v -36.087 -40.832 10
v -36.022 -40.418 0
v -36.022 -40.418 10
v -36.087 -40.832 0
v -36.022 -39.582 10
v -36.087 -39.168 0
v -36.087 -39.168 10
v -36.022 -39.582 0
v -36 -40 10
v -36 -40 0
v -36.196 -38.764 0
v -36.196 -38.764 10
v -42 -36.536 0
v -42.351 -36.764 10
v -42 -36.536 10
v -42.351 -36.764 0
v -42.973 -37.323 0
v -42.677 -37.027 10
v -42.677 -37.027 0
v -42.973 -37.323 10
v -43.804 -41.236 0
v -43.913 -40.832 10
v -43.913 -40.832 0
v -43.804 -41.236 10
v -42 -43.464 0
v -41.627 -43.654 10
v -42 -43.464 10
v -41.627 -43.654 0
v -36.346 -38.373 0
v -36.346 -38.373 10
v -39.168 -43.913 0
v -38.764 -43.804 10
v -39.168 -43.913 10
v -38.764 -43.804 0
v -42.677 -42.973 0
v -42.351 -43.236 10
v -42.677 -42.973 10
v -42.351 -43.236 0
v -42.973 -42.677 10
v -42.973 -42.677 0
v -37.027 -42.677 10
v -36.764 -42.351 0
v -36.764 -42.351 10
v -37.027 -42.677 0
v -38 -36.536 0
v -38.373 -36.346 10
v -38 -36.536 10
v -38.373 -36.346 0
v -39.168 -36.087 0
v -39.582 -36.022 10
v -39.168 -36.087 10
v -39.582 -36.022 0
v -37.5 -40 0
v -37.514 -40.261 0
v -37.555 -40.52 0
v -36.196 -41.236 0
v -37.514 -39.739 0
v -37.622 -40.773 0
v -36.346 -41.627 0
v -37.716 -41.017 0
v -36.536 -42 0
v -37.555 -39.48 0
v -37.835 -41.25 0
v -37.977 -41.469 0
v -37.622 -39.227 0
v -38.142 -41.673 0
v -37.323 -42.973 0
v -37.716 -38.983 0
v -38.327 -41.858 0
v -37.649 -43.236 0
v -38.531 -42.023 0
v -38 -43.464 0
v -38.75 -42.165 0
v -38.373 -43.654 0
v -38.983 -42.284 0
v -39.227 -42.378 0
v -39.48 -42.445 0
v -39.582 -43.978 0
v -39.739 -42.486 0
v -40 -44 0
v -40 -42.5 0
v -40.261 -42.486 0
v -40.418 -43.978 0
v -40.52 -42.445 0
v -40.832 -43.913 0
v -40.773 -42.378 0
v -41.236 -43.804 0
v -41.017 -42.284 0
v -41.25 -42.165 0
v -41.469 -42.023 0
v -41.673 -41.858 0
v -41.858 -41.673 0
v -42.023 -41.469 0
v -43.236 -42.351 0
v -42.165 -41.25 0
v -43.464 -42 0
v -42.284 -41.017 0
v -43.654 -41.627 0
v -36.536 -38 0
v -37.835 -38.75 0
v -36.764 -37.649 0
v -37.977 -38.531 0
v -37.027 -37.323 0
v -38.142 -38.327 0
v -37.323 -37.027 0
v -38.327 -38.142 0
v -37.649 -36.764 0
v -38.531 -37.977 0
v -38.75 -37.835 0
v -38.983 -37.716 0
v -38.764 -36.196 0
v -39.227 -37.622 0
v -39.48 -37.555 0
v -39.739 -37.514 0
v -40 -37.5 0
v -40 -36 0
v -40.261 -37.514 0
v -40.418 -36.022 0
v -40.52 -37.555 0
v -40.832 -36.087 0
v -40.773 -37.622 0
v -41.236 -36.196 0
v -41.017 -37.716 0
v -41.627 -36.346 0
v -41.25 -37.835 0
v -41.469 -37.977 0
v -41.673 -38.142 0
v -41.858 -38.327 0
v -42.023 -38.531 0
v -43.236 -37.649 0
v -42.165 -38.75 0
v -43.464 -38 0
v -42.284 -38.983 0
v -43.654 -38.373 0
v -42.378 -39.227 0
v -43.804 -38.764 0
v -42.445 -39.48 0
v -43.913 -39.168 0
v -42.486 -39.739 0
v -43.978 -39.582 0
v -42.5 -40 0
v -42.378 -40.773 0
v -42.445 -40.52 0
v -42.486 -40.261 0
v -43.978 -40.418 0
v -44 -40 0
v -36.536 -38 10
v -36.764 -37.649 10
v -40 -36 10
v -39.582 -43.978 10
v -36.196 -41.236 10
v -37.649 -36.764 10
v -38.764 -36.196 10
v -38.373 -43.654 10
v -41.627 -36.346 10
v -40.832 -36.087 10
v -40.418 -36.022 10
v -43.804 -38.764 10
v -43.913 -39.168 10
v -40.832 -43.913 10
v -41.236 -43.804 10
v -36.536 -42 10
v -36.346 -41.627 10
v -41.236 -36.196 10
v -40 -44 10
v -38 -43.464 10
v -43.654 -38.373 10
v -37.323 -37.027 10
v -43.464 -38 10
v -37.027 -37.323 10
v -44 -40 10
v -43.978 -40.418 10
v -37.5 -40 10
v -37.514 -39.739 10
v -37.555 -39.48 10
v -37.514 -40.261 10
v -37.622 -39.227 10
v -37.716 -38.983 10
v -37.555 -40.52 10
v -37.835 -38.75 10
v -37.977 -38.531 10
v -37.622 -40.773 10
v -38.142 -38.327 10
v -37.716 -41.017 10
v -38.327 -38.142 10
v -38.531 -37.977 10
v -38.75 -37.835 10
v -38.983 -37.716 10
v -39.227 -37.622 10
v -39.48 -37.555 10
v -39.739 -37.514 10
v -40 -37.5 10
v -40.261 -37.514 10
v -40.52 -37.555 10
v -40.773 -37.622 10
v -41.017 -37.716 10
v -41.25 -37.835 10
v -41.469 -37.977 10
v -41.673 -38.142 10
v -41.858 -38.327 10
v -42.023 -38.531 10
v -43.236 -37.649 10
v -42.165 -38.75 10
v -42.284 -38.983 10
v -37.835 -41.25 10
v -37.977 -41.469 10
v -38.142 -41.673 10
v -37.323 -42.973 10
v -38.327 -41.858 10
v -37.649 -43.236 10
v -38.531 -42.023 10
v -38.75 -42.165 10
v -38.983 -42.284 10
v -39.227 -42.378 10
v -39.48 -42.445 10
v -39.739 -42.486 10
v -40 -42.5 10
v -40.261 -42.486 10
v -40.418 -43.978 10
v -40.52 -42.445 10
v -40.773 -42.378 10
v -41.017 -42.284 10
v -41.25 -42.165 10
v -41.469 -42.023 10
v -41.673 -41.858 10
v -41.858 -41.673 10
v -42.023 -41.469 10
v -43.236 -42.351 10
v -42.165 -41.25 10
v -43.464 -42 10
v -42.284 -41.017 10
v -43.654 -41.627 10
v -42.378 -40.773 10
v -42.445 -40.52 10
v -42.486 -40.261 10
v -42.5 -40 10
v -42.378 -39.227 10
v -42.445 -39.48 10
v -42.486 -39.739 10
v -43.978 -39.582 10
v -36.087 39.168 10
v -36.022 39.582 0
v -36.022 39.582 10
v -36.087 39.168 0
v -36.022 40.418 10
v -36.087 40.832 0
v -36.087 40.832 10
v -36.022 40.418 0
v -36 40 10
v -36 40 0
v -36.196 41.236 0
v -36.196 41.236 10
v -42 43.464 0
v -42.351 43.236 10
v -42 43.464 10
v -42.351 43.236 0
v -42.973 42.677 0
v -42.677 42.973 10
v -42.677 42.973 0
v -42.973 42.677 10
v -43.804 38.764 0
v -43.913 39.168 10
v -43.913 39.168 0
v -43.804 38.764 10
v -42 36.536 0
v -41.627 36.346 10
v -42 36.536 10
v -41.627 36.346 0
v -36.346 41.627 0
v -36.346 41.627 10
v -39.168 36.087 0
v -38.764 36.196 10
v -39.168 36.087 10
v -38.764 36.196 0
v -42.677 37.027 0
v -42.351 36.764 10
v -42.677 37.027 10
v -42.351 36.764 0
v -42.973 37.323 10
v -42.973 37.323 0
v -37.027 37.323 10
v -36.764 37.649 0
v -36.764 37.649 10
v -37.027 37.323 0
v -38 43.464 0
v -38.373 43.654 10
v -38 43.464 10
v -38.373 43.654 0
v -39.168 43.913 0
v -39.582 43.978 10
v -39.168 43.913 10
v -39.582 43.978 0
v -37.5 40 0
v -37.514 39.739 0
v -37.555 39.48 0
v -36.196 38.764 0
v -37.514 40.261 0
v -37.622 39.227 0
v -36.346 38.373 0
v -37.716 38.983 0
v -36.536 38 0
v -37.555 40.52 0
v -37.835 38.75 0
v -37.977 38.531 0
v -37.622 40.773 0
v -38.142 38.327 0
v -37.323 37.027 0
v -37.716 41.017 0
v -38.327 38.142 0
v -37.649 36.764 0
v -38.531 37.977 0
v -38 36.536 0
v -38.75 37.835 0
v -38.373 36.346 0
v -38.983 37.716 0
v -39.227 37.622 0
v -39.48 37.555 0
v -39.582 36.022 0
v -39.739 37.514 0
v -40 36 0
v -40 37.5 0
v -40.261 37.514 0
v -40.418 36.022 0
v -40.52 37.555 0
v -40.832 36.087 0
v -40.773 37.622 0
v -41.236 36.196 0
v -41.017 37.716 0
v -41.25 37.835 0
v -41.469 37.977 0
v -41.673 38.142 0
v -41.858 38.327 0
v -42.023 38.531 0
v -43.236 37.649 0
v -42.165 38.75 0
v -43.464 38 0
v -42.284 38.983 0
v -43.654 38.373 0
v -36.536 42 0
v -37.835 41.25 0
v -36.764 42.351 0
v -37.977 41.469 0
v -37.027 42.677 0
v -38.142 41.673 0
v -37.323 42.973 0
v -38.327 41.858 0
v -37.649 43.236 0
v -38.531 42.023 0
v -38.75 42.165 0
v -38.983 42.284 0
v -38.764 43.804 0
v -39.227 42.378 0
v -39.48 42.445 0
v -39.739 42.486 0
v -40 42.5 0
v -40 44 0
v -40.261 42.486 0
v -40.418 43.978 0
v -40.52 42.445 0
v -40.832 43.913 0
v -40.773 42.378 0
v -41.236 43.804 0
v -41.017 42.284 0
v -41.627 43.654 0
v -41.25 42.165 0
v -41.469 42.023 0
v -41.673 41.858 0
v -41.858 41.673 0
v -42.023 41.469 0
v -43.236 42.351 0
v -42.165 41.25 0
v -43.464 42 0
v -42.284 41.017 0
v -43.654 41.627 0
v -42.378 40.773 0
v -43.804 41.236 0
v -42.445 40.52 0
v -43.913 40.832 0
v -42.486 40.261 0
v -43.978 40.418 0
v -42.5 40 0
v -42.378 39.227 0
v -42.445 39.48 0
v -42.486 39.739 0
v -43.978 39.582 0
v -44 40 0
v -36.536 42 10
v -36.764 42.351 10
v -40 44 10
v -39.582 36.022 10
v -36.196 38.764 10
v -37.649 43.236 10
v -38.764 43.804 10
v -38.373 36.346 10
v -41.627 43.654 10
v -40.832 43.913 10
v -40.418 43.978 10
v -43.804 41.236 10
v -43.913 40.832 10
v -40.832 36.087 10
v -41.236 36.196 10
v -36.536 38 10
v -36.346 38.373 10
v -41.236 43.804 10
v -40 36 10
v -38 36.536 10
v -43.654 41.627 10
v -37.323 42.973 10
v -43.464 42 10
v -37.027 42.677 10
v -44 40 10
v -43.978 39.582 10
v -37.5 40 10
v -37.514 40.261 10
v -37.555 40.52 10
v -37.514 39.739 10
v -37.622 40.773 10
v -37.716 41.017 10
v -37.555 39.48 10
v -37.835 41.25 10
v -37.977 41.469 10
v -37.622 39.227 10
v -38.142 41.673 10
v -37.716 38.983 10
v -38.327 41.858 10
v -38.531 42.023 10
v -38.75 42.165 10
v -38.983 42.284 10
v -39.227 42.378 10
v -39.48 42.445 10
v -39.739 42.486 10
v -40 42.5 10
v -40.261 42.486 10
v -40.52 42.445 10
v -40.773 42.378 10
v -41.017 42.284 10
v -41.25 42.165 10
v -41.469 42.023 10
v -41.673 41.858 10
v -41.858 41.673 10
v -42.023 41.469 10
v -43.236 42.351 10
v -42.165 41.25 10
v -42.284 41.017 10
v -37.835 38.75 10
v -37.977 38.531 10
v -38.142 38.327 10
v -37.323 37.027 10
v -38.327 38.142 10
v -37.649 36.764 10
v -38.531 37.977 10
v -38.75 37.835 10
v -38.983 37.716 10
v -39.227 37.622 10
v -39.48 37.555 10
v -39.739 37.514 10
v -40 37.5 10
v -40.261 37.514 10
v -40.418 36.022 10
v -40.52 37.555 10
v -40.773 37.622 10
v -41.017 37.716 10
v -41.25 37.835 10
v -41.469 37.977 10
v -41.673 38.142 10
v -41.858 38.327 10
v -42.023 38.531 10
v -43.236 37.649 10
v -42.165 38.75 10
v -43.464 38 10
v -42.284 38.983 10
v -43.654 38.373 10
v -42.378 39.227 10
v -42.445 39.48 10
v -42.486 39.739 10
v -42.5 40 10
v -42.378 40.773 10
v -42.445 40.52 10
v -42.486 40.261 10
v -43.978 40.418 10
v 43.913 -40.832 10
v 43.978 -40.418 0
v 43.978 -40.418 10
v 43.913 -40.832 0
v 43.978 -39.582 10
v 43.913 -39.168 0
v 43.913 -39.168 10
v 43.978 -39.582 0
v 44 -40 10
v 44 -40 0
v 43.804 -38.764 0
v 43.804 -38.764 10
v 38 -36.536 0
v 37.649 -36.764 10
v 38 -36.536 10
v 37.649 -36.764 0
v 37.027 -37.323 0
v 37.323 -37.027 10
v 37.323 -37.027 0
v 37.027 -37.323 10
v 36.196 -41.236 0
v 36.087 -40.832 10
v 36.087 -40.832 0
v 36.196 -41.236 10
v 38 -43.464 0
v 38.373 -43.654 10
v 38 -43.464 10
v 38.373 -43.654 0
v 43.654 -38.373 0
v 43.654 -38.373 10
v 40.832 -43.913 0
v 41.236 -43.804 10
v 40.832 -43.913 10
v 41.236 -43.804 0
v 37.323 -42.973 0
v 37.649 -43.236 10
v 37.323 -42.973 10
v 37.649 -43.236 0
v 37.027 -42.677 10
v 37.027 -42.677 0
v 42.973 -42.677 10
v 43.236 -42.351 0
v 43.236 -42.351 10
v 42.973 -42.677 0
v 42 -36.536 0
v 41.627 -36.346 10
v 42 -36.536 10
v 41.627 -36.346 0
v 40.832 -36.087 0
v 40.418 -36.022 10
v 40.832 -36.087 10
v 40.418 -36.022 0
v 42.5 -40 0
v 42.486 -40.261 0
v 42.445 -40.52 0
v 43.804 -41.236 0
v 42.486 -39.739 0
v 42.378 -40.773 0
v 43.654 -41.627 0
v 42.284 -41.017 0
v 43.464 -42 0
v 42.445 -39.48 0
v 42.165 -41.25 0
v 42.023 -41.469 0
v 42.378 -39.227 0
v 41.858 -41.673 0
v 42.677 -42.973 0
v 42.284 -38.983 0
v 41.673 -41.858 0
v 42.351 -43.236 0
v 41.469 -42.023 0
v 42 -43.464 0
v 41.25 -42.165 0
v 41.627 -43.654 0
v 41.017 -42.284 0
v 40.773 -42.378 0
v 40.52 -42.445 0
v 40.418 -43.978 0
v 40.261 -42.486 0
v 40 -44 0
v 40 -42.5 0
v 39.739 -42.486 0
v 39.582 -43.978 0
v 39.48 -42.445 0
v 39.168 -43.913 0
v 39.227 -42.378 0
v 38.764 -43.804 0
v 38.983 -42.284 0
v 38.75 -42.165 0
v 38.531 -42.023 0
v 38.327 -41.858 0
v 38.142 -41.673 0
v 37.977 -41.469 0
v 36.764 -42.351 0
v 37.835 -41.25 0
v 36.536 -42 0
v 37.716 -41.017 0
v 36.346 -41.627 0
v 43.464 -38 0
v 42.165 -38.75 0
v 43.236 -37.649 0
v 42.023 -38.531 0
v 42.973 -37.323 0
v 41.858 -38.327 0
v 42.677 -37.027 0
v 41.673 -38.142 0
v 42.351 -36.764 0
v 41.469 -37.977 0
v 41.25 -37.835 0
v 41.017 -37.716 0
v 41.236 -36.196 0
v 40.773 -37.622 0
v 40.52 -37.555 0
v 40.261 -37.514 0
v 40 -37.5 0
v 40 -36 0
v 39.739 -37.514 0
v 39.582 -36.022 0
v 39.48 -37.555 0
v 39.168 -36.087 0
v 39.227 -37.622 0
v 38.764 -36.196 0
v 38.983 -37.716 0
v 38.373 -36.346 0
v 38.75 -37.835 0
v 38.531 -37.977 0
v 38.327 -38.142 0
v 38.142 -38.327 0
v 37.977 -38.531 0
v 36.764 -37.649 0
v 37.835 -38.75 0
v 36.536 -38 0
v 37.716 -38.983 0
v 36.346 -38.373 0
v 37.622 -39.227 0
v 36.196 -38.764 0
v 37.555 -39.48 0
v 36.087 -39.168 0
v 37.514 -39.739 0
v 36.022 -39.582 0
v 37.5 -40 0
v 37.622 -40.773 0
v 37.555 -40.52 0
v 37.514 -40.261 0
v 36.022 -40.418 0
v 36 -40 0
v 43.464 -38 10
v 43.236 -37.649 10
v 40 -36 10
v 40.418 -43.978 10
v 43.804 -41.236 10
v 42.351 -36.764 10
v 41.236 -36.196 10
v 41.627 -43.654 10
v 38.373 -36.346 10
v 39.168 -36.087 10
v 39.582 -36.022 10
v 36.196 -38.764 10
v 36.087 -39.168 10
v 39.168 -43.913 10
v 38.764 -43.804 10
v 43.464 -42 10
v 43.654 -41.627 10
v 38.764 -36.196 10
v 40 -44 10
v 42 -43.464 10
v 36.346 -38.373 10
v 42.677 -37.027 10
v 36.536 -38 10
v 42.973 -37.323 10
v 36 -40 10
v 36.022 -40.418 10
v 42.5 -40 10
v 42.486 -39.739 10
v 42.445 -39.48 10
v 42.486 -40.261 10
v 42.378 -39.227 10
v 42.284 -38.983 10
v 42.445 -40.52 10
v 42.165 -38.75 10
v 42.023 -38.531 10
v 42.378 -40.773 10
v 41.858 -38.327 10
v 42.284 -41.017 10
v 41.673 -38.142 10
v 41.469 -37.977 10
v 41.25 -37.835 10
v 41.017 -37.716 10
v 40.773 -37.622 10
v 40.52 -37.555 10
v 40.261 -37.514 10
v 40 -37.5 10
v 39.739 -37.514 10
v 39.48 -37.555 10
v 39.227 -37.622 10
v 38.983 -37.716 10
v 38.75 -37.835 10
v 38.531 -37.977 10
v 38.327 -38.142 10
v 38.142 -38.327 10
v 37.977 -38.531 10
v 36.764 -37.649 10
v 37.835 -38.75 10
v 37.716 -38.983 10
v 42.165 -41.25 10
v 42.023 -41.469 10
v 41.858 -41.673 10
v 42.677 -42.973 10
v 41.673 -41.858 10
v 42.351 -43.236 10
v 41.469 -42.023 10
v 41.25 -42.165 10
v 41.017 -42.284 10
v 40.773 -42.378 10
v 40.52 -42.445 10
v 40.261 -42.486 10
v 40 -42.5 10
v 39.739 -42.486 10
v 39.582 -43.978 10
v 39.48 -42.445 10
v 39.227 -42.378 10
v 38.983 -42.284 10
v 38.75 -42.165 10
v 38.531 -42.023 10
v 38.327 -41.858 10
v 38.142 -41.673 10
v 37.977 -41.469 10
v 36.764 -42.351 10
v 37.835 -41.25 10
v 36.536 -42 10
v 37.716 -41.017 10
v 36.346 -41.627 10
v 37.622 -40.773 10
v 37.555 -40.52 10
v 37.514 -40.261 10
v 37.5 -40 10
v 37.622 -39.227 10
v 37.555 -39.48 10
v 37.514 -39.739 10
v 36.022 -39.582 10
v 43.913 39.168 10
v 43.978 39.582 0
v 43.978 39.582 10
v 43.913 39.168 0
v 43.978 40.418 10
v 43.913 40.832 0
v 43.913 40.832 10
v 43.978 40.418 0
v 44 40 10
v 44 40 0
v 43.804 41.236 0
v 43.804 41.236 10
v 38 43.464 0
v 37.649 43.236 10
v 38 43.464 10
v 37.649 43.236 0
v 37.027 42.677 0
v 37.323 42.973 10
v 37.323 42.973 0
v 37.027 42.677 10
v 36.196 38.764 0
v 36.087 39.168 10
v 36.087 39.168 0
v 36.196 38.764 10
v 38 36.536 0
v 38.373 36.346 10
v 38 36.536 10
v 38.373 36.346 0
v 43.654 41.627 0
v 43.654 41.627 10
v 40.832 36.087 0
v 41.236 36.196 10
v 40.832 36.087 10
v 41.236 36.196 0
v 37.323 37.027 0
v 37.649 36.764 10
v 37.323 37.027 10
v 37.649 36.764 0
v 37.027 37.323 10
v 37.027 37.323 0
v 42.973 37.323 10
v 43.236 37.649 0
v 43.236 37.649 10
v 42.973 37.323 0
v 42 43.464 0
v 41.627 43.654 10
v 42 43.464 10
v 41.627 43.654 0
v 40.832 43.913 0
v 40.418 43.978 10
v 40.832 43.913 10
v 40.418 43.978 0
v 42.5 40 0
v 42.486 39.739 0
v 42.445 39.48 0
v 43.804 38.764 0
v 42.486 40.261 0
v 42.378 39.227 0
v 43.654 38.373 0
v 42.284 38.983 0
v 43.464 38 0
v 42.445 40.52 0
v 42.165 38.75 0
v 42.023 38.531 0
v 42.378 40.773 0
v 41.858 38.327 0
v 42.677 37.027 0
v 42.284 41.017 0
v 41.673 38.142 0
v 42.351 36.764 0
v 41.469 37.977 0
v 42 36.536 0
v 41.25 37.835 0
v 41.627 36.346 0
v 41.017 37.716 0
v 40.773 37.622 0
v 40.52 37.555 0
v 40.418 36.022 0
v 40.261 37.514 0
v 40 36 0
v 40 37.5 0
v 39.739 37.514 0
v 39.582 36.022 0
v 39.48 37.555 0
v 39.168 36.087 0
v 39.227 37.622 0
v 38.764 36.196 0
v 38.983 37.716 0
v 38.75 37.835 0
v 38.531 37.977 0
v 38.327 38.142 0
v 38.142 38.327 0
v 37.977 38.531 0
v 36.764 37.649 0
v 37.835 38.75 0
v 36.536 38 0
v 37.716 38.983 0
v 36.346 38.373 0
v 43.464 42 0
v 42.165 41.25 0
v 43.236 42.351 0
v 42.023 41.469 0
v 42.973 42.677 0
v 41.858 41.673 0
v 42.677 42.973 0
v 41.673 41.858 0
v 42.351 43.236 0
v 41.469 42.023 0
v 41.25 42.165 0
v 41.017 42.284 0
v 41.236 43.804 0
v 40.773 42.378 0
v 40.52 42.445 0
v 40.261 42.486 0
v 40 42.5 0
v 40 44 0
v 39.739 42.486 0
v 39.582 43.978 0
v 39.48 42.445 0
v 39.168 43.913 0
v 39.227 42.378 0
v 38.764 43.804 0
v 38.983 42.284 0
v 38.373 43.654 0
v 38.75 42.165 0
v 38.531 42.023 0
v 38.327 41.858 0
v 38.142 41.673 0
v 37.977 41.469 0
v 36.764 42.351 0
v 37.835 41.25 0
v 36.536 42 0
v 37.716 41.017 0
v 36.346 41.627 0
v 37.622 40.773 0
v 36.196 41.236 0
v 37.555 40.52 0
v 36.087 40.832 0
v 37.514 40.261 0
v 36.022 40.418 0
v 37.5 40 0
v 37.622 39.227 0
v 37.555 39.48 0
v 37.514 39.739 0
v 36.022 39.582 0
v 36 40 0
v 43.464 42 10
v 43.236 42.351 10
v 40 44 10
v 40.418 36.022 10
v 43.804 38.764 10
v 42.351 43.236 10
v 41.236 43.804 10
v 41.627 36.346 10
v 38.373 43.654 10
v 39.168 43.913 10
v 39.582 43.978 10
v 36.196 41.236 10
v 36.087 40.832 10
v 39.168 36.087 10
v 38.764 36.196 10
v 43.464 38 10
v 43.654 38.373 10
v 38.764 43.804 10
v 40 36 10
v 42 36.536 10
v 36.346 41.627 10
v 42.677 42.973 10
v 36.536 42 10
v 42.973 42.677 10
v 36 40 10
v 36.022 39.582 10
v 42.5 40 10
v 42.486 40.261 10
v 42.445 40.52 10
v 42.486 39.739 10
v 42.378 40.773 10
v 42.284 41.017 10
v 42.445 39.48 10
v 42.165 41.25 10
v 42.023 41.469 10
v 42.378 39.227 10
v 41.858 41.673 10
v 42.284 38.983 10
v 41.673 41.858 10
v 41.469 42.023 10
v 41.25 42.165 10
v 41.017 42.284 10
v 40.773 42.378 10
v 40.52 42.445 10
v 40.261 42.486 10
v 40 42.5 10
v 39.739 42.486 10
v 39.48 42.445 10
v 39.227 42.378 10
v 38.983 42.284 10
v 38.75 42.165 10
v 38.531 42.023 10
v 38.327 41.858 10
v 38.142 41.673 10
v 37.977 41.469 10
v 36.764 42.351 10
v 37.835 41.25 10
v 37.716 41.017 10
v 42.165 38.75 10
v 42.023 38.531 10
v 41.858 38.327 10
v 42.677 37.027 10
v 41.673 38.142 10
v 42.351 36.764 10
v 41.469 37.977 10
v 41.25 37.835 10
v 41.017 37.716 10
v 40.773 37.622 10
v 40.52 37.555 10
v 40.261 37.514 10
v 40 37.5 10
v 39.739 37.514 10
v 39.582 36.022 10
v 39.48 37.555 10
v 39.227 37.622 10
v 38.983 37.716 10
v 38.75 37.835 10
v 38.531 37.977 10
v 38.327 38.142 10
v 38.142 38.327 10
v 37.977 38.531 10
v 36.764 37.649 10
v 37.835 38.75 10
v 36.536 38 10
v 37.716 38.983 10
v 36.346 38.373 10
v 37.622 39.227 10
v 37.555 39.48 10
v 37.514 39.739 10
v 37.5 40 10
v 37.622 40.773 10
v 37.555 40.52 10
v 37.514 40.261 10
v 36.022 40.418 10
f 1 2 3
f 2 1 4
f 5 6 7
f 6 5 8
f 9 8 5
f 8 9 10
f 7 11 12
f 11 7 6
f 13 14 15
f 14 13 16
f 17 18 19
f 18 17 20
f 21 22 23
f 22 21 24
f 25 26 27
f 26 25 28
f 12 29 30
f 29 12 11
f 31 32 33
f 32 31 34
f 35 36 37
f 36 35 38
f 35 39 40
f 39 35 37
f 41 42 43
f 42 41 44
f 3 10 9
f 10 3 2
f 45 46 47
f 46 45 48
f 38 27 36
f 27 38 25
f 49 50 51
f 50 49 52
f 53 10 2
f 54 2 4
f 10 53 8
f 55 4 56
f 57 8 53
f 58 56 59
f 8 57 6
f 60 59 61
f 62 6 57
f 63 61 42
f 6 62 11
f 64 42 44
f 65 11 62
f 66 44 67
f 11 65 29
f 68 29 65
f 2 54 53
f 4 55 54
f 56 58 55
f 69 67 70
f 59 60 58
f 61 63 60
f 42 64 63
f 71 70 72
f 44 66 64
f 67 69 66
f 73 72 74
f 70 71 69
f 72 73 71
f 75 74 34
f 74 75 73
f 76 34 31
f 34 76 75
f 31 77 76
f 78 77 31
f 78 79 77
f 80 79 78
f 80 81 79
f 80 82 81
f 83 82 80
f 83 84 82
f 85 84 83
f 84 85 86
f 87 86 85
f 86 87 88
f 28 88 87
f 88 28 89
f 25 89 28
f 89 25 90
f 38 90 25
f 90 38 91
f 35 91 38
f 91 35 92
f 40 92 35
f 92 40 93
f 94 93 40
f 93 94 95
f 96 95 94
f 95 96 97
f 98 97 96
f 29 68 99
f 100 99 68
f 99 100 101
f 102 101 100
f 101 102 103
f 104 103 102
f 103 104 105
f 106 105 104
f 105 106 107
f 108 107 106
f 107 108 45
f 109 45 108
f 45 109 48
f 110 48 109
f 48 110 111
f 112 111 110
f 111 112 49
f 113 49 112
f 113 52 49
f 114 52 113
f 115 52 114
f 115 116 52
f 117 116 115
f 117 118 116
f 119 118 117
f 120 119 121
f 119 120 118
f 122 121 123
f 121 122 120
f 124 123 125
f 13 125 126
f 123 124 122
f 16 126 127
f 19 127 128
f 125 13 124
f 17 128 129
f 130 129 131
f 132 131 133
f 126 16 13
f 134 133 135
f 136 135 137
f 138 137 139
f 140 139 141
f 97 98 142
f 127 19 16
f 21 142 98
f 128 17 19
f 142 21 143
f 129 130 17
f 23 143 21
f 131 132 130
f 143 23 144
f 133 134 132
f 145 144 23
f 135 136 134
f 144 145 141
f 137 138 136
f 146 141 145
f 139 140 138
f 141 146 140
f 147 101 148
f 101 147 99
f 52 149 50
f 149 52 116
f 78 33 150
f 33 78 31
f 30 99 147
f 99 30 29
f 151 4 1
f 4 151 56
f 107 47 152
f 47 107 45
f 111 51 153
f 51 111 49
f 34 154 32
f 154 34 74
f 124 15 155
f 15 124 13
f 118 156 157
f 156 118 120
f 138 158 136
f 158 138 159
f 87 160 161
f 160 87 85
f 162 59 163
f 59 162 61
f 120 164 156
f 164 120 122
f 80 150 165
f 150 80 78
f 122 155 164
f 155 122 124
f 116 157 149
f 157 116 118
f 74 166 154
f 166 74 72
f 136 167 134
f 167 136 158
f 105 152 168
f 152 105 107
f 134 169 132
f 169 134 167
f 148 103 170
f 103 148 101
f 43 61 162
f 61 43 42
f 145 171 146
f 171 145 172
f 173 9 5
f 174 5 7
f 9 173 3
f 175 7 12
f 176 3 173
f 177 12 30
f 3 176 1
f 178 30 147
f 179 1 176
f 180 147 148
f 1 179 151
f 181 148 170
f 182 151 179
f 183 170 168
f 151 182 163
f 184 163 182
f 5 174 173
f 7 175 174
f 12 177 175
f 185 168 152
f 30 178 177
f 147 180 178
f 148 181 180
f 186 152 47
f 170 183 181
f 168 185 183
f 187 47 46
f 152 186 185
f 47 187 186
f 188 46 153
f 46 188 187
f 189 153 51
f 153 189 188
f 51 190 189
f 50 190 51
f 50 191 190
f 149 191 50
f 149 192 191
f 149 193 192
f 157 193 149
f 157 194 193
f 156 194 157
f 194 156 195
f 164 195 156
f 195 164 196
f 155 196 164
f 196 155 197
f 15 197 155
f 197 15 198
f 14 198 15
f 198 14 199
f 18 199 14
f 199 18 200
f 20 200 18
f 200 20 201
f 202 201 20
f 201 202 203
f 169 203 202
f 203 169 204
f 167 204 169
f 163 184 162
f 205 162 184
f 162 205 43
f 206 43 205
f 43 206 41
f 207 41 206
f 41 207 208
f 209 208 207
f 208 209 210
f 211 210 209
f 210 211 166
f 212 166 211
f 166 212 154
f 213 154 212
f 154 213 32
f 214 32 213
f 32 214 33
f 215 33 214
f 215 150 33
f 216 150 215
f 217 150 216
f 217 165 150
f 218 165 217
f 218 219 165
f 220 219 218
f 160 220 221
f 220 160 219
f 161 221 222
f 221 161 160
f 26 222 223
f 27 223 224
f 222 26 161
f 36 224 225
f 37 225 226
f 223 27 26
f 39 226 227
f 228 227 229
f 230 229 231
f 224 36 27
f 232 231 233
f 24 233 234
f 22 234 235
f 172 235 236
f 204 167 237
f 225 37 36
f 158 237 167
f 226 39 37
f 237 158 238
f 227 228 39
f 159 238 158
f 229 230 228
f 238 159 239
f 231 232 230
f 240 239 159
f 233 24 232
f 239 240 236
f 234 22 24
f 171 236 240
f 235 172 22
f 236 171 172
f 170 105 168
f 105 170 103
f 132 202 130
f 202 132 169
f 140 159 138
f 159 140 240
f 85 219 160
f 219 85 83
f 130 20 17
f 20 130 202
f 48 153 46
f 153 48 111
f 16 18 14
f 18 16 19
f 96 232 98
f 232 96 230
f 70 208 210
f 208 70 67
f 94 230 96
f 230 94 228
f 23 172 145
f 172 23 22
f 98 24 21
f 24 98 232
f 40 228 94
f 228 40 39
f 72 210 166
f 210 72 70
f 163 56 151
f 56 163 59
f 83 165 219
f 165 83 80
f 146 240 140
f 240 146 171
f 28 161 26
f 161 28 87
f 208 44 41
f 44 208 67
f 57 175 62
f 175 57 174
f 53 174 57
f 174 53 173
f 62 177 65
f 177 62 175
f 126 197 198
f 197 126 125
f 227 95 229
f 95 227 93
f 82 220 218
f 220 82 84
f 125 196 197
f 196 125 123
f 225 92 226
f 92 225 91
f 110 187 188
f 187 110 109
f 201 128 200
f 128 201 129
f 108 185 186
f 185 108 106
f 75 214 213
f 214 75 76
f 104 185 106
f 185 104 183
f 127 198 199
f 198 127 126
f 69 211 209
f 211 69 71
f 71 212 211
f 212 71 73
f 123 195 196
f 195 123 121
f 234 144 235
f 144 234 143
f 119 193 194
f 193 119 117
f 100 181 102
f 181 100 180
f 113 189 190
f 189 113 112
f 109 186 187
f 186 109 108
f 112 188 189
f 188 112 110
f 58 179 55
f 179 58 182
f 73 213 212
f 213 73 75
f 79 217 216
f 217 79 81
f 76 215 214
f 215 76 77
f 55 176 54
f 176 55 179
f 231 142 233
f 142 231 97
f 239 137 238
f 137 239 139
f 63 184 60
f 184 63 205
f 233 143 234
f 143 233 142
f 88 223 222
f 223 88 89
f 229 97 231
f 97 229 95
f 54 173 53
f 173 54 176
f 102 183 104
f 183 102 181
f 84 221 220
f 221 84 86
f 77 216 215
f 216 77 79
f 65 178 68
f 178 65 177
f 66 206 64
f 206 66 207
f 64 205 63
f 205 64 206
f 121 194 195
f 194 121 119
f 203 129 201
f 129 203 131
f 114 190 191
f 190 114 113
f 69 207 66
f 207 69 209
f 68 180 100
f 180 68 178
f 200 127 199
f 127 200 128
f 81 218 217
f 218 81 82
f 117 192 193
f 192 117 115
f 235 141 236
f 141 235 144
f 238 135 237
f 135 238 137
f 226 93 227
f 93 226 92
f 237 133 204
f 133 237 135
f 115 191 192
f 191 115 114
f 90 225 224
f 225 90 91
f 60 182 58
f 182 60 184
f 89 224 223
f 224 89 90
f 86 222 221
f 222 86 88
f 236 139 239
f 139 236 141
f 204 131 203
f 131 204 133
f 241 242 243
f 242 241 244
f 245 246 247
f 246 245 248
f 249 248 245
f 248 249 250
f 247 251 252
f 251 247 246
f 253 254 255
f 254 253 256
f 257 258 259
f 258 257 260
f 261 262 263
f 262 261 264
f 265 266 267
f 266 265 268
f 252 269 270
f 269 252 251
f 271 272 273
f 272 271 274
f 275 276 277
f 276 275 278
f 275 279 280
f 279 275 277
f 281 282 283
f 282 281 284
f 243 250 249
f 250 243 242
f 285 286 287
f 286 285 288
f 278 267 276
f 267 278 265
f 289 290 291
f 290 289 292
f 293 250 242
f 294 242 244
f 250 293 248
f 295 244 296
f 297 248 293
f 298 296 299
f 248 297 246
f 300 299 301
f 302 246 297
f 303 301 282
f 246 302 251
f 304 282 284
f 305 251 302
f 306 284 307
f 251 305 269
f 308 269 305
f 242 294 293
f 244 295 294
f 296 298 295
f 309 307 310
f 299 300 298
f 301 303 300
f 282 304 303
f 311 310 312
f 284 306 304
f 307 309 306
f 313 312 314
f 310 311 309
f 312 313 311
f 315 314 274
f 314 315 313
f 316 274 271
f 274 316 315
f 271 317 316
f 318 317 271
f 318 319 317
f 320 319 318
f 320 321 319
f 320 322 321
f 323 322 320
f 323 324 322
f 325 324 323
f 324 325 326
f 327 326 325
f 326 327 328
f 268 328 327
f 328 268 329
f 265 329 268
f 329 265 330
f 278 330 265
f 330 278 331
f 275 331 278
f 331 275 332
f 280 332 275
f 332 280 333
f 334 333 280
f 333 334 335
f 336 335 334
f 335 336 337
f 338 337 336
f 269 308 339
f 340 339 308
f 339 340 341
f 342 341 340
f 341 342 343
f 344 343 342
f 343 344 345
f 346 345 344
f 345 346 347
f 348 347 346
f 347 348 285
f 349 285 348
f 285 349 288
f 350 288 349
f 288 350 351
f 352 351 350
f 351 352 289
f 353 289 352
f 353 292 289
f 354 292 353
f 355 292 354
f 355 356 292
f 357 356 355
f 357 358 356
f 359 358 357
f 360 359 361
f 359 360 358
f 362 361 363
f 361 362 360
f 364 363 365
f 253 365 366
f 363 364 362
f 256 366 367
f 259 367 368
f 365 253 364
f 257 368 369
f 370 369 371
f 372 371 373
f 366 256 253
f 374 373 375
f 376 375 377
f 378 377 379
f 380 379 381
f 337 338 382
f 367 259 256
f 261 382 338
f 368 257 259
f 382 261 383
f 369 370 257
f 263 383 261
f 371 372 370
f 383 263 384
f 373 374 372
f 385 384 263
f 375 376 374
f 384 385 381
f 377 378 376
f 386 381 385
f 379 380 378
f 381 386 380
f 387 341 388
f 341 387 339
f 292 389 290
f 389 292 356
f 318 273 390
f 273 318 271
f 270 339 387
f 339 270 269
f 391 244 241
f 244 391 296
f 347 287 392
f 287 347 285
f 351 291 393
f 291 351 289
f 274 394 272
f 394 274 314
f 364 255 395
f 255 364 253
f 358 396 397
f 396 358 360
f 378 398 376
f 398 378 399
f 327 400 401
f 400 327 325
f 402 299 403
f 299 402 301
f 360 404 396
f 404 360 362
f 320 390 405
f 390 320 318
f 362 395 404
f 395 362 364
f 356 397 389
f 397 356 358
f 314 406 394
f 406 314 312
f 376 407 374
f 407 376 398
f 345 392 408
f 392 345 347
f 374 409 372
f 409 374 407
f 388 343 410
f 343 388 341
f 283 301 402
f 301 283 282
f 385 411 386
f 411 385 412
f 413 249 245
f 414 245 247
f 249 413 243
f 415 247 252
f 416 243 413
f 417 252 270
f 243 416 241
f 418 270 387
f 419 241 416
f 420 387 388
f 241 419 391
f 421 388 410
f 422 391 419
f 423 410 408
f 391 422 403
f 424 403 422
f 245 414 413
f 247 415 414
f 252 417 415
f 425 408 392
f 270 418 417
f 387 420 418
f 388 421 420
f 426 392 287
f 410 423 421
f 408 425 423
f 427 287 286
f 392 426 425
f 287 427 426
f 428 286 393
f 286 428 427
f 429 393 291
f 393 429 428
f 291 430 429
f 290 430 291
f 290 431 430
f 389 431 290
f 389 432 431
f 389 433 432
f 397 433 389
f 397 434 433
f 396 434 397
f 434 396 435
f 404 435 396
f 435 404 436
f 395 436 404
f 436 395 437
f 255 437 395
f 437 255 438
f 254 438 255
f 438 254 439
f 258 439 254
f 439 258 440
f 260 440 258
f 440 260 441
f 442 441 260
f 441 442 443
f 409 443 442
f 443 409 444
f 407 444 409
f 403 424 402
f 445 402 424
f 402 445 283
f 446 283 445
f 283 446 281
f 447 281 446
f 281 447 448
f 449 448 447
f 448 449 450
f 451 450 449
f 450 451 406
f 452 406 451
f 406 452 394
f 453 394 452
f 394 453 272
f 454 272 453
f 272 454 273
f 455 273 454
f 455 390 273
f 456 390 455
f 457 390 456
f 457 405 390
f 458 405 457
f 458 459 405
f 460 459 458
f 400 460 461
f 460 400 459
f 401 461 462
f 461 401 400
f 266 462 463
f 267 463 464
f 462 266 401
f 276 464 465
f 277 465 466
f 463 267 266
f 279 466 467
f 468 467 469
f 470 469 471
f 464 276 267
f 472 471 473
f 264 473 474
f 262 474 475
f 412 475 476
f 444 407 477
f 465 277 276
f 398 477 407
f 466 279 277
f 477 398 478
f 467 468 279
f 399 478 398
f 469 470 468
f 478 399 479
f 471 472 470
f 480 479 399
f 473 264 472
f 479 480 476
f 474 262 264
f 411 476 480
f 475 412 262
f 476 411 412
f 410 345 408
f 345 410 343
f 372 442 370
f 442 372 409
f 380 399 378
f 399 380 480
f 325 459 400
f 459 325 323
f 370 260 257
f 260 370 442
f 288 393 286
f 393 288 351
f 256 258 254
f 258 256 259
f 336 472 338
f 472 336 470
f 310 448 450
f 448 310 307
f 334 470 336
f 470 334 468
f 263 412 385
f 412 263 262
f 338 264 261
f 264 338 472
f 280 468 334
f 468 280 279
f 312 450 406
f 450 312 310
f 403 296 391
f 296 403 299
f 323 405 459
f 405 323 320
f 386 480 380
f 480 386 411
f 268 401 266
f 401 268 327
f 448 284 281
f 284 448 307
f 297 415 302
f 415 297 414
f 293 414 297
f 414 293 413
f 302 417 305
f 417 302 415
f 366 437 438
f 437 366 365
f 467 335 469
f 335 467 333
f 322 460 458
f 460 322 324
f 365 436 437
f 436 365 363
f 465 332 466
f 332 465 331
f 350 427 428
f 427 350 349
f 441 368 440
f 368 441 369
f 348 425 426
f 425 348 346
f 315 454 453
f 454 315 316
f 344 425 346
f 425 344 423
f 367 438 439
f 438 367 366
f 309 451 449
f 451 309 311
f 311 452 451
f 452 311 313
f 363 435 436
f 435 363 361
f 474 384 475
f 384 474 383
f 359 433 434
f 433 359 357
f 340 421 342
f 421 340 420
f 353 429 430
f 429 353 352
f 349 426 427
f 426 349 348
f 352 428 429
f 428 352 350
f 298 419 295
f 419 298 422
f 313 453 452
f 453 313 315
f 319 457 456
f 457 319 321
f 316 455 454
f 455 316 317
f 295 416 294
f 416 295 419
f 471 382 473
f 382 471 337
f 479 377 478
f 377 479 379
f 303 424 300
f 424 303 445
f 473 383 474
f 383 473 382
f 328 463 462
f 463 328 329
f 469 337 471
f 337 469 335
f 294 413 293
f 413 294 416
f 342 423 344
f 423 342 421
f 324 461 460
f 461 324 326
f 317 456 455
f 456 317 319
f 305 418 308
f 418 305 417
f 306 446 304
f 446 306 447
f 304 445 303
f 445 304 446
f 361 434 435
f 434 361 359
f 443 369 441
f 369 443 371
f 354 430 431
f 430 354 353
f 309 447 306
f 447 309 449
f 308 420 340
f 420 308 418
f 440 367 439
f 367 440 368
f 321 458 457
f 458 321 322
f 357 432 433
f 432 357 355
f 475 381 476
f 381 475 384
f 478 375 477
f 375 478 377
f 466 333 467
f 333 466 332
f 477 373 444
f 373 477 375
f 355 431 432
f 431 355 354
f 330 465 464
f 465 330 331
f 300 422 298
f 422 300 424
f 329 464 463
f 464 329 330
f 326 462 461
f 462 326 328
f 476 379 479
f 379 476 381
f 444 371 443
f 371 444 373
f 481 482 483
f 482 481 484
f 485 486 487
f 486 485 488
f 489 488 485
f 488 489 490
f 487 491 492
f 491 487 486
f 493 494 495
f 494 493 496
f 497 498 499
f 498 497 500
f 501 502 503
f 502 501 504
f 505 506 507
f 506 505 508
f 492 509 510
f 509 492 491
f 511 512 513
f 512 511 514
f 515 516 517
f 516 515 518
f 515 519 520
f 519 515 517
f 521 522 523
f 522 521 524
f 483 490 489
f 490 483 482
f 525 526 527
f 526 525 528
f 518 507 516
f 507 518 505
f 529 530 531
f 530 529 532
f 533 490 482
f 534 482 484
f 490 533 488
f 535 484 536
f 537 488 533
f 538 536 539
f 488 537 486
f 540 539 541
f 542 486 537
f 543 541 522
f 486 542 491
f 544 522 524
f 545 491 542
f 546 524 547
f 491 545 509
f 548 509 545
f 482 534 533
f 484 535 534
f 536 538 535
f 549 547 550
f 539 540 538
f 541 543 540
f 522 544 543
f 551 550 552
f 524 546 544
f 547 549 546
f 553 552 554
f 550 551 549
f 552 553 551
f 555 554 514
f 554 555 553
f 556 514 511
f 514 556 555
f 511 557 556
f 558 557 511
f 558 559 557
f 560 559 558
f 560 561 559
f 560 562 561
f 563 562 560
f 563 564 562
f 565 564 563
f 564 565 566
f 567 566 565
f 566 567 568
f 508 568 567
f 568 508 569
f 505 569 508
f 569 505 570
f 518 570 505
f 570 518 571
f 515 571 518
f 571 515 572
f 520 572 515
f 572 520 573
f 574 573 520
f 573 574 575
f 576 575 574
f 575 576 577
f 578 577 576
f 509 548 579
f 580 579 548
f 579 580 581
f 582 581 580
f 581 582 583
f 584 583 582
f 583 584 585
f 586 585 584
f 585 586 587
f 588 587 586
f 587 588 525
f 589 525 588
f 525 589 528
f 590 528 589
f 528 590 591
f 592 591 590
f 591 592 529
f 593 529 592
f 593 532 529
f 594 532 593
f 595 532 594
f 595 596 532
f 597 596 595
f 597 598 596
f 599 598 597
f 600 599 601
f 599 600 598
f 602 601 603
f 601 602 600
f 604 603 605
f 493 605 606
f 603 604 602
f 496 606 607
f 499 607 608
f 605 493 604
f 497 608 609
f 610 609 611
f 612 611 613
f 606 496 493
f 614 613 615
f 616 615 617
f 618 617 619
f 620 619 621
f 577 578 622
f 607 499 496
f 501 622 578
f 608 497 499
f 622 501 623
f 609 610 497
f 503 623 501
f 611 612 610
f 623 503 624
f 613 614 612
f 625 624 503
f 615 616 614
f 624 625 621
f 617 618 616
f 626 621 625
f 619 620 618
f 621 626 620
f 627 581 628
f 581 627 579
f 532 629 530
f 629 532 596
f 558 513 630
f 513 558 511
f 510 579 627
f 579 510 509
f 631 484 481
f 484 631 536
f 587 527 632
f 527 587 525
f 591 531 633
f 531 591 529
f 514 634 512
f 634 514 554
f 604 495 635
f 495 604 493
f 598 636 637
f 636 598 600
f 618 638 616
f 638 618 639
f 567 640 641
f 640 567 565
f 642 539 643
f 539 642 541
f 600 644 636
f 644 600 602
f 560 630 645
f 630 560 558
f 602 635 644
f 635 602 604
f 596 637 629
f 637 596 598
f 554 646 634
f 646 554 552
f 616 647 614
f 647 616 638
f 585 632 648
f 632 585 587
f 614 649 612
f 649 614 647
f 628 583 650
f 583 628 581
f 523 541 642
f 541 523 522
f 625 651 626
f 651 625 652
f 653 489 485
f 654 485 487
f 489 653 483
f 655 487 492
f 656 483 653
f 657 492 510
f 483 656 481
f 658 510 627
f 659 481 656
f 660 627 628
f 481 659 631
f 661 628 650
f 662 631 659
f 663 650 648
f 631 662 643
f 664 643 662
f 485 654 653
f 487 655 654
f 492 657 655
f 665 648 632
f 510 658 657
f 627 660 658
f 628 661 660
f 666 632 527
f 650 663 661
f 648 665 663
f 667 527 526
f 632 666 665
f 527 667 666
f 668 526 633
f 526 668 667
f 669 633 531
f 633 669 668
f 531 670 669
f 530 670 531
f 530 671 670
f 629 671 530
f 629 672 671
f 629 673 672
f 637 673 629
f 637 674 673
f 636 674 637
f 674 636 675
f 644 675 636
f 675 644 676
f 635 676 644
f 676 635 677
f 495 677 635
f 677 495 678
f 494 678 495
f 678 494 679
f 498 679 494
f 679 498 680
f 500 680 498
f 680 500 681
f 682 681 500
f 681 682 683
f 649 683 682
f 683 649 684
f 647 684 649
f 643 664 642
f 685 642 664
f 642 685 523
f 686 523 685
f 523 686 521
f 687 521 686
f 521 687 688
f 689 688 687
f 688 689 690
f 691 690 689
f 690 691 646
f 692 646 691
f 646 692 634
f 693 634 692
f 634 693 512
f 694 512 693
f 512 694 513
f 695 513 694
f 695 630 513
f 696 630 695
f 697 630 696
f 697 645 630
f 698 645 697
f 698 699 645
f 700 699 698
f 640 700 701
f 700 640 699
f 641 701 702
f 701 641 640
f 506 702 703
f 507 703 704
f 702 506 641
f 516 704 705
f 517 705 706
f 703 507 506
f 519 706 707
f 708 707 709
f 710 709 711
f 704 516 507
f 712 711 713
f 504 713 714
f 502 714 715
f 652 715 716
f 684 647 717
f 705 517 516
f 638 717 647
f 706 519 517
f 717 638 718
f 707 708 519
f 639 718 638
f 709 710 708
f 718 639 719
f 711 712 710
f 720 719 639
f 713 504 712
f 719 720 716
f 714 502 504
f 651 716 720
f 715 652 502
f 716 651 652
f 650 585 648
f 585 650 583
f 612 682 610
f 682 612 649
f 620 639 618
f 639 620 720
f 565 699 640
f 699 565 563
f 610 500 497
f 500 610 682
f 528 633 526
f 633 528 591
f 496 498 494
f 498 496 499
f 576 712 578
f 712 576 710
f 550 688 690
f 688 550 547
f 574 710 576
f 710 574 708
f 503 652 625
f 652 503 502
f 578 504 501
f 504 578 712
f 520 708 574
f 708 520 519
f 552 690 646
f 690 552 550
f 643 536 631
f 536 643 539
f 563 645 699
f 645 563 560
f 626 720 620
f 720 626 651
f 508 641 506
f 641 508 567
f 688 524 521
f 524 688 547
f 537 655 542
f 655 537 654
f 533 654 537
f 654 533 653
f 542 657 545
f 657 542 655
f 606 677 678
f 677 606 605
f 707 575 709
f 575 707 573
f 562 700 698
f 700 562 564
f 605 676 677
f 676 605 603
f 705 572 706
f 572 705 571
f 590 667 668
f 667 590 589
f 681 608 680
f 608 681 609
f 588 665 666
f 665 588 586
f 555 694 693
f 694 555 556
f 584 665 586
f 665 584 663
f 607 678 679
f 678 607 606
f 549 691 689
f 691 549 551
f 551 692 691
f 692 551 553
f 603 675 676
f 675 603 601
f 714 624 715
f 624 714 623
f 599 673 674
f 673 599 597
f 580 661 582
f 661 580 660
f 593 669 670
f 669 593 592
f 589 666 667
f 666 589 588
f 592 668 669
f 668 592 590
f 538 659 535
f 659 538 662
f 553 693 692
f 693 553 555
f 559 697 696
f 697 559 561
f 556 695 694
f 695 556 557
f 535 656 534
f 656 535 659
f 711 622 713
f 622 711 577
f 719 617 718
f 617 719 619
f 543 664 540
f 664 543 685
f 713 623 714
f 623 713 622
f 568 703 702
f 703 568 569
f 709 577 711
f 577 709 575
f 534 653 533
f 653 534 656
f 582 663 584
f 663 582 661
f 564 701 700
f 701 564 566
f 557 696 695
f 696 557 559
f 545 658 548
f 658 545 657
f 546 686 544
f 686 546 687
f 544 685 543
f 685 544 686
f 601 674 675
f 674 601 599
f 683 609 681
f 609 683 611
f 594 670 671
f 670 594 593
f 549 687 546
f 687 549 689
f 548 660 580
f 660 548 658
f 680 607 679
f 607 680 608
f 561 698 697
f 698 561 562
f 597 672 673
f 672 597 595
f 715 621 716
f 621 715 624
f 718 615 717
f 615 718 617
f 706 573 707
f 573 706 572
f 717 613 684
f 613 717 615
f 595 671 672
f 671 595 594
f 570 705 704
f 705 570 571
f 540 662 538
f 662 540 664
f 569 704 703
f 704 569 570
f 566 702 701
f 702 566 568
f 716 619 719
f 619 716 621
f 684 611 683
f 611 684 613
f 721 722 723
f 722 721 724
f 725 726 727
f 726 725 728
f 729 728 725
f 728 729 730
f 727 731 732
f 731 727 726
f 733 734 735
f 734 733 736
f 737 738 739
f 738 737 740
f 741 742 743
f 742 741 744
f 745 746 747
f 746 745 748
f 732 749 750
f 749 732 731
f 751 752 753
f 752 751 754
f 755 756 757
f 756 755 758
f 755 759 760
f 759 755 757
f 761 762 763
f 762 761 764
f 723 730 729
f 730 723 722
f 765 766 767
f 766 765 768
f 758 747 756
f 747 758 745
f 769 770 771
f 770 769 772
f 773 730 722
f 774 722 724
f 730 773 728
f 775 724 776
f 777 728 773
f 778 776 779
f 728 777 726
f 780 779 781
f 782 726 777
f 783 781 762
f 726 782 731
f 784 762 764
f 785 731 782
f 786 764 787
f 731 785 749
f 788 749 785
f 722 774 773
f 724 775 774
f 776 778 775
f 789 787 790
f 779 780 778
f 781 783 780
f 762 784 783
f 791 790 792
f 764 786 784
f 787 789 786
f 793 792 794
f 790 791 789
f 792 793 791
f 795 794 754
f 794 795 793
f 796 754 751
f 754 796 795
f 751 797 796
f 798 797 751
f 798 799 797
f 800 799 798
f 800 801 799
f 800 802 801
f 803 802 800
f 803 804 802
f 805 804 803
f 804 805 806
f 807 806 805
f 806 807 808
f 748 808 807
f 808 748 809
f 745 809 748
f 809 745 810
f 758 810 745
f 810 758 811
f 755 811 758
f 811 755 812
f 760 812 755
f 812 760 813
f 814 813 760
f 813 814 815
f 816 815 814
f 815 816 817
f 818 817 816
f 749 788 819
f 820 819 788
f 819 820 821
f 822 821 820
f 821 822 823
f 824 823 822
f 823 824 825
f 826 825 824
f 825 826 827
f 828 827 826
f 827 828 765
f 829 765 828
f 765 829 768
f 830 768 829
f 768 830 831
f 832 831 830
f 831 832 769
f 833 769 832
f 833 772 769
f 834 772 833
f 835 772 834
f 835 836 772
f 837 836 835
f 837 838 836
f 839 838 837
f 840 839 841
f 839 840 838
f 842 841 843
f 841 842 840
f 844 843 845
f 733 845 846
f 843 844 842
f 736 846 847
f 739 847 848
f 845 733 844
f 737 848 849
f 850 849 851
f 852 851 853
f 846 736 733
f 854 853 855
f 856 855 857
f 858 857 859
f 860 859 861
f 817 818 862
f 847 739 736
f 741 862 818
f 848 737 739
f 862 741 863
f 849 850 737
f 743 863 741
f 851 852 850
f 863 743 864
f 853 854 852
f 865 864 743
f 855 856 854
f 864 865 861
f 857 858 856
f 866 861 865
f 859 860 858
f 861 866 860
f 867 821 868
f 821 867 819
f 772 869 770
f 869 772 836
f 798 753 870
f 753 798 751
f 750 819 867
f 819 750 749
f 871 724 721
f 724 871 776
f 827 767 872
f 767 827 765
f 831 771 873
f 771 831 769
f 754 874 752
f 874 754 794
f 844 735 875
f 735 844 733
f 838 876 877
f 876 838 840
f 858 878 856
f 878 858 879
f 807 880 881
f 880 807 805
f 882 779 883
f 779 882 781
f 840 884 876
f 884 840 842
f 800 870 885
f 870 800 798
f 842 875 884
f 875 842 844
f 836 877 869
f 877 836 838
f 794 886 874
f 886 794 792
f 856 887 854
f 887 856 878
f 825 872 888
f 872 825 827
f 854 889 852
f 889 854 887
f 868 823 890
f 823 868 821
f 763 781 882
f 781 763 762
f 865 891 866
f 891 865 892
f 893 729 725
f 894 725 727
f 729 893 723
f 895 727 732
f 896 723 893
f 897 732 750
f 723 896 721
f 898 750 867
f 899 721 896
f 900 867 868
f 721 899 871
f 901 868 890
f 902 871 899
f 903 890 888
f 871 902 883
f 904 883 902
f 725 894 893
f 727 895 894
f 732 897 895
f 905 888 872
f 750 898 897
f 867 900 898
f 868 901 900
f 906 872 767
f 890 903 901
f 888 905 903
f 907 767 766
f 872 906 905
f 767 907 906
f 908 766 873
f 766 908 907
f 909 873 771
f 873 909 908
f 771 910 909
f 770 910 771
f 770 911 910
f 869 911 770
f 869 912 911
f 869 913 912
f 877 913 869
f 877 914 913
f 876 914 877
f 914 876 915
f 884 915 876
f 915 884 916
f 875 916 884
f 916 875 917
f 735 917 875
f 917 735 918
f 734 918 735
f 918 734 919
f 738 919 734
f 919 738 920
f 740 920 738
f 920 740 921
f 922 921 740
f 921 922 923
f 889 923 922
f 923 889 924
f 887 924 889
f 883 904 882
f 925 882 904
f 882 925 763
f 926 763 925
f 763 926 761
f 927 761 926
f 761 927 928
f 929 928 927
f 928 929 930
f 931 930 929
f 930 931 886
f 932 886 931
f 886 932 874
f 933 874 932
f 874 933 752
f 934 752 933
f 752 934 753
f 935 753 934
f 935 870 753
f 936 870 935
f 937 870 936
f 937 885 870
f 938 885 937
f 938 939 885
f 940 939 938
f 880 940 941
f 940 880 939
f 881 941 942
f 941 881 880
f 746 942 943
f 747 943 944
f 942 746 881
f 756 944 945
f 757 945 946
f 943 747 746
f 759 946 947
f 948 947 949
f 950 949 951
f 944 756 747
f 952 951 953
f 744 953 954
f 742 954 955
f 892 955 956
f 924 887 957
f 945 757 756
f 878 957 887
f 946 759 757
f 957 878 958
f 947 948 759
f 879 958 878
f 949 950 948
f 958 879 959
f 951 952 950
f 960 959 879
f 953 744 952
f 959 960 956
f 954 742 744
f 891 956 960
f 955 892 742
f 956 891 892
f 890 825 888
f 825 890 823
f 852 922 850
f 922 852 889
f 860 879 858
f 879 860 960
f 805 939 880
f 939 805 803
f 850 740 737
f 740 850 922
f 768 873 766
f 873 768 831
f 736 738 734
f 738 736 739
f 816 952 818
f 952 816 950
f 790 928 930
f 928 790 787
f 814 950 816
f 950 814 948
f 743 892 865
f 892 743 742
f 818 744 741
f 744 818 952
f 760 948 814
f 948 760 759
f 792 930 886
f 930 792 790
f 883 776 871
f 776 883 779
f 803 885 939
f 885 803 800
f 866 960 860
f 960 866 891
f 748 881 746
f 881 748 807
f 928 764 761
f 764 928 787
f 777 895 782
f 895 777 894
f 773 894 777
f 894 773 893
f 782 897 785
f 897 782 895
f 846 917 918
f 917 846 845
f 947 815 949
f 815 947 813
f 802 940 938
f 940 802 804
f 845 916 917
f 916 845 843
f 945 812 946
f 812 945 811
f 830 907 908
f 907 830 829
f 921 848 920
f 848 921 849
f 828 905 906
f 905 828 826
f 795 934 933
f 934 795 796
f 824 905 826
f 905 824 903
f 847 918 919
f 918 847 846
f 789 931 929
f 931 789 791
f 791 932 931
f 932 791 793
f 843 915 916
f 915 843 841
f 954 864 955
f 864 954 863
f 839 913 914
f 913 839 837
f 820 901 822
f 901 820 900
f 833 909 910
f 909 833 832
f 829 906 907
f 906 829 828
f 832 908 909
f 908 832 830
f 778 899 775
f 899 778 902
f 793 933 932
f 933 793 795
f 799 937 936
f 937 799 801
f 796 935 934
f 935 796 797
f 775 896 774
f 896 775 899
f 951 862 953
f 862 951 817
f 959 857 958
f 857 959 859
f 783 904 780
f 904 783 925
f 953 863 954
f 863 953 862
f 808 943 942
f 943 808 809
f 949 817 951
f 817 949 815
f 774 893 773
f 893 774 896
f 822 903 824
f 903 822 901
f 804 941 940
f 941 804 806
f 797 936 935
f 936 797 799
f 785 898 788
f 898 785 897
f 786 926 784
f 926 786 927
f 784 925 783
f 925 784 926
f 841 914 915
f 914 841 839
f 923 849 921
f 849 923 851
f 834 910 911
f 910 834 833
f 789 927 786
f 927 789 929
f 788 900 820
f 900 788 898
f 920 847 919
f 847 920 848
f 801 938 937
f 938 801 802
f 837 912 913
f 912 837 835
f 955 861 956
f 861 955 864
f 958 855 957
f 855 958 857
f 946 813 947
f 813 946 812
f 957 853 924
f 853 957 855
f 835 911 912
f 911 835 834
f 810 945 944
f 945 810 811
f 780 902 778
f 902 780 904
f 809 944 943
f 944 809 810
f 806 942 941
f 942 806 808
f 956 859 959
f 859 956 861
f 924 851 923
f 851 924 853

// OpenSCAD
include <MCAD/units.scad>

shellSize = 5;
speakerHoleDistance = 80;           
spacerHeight = 5;

$fn = 60;

module SpeakerSpacers() {
    for (x=[-1, 1], y=[-1, 1]) {
        translate([x * speakerHoleDistance / 2, y * speakerHoleDistance / 2])
        difference() {
            cylinder(h=shellSize + spacerHeight, r=4);
        
            translate([0, 0, -epsilon])
            cylinder(h=shellSize + spacerHeight + epsilon * 2, r=2.5);
        }
    }
}

SpeakerSpacers();
